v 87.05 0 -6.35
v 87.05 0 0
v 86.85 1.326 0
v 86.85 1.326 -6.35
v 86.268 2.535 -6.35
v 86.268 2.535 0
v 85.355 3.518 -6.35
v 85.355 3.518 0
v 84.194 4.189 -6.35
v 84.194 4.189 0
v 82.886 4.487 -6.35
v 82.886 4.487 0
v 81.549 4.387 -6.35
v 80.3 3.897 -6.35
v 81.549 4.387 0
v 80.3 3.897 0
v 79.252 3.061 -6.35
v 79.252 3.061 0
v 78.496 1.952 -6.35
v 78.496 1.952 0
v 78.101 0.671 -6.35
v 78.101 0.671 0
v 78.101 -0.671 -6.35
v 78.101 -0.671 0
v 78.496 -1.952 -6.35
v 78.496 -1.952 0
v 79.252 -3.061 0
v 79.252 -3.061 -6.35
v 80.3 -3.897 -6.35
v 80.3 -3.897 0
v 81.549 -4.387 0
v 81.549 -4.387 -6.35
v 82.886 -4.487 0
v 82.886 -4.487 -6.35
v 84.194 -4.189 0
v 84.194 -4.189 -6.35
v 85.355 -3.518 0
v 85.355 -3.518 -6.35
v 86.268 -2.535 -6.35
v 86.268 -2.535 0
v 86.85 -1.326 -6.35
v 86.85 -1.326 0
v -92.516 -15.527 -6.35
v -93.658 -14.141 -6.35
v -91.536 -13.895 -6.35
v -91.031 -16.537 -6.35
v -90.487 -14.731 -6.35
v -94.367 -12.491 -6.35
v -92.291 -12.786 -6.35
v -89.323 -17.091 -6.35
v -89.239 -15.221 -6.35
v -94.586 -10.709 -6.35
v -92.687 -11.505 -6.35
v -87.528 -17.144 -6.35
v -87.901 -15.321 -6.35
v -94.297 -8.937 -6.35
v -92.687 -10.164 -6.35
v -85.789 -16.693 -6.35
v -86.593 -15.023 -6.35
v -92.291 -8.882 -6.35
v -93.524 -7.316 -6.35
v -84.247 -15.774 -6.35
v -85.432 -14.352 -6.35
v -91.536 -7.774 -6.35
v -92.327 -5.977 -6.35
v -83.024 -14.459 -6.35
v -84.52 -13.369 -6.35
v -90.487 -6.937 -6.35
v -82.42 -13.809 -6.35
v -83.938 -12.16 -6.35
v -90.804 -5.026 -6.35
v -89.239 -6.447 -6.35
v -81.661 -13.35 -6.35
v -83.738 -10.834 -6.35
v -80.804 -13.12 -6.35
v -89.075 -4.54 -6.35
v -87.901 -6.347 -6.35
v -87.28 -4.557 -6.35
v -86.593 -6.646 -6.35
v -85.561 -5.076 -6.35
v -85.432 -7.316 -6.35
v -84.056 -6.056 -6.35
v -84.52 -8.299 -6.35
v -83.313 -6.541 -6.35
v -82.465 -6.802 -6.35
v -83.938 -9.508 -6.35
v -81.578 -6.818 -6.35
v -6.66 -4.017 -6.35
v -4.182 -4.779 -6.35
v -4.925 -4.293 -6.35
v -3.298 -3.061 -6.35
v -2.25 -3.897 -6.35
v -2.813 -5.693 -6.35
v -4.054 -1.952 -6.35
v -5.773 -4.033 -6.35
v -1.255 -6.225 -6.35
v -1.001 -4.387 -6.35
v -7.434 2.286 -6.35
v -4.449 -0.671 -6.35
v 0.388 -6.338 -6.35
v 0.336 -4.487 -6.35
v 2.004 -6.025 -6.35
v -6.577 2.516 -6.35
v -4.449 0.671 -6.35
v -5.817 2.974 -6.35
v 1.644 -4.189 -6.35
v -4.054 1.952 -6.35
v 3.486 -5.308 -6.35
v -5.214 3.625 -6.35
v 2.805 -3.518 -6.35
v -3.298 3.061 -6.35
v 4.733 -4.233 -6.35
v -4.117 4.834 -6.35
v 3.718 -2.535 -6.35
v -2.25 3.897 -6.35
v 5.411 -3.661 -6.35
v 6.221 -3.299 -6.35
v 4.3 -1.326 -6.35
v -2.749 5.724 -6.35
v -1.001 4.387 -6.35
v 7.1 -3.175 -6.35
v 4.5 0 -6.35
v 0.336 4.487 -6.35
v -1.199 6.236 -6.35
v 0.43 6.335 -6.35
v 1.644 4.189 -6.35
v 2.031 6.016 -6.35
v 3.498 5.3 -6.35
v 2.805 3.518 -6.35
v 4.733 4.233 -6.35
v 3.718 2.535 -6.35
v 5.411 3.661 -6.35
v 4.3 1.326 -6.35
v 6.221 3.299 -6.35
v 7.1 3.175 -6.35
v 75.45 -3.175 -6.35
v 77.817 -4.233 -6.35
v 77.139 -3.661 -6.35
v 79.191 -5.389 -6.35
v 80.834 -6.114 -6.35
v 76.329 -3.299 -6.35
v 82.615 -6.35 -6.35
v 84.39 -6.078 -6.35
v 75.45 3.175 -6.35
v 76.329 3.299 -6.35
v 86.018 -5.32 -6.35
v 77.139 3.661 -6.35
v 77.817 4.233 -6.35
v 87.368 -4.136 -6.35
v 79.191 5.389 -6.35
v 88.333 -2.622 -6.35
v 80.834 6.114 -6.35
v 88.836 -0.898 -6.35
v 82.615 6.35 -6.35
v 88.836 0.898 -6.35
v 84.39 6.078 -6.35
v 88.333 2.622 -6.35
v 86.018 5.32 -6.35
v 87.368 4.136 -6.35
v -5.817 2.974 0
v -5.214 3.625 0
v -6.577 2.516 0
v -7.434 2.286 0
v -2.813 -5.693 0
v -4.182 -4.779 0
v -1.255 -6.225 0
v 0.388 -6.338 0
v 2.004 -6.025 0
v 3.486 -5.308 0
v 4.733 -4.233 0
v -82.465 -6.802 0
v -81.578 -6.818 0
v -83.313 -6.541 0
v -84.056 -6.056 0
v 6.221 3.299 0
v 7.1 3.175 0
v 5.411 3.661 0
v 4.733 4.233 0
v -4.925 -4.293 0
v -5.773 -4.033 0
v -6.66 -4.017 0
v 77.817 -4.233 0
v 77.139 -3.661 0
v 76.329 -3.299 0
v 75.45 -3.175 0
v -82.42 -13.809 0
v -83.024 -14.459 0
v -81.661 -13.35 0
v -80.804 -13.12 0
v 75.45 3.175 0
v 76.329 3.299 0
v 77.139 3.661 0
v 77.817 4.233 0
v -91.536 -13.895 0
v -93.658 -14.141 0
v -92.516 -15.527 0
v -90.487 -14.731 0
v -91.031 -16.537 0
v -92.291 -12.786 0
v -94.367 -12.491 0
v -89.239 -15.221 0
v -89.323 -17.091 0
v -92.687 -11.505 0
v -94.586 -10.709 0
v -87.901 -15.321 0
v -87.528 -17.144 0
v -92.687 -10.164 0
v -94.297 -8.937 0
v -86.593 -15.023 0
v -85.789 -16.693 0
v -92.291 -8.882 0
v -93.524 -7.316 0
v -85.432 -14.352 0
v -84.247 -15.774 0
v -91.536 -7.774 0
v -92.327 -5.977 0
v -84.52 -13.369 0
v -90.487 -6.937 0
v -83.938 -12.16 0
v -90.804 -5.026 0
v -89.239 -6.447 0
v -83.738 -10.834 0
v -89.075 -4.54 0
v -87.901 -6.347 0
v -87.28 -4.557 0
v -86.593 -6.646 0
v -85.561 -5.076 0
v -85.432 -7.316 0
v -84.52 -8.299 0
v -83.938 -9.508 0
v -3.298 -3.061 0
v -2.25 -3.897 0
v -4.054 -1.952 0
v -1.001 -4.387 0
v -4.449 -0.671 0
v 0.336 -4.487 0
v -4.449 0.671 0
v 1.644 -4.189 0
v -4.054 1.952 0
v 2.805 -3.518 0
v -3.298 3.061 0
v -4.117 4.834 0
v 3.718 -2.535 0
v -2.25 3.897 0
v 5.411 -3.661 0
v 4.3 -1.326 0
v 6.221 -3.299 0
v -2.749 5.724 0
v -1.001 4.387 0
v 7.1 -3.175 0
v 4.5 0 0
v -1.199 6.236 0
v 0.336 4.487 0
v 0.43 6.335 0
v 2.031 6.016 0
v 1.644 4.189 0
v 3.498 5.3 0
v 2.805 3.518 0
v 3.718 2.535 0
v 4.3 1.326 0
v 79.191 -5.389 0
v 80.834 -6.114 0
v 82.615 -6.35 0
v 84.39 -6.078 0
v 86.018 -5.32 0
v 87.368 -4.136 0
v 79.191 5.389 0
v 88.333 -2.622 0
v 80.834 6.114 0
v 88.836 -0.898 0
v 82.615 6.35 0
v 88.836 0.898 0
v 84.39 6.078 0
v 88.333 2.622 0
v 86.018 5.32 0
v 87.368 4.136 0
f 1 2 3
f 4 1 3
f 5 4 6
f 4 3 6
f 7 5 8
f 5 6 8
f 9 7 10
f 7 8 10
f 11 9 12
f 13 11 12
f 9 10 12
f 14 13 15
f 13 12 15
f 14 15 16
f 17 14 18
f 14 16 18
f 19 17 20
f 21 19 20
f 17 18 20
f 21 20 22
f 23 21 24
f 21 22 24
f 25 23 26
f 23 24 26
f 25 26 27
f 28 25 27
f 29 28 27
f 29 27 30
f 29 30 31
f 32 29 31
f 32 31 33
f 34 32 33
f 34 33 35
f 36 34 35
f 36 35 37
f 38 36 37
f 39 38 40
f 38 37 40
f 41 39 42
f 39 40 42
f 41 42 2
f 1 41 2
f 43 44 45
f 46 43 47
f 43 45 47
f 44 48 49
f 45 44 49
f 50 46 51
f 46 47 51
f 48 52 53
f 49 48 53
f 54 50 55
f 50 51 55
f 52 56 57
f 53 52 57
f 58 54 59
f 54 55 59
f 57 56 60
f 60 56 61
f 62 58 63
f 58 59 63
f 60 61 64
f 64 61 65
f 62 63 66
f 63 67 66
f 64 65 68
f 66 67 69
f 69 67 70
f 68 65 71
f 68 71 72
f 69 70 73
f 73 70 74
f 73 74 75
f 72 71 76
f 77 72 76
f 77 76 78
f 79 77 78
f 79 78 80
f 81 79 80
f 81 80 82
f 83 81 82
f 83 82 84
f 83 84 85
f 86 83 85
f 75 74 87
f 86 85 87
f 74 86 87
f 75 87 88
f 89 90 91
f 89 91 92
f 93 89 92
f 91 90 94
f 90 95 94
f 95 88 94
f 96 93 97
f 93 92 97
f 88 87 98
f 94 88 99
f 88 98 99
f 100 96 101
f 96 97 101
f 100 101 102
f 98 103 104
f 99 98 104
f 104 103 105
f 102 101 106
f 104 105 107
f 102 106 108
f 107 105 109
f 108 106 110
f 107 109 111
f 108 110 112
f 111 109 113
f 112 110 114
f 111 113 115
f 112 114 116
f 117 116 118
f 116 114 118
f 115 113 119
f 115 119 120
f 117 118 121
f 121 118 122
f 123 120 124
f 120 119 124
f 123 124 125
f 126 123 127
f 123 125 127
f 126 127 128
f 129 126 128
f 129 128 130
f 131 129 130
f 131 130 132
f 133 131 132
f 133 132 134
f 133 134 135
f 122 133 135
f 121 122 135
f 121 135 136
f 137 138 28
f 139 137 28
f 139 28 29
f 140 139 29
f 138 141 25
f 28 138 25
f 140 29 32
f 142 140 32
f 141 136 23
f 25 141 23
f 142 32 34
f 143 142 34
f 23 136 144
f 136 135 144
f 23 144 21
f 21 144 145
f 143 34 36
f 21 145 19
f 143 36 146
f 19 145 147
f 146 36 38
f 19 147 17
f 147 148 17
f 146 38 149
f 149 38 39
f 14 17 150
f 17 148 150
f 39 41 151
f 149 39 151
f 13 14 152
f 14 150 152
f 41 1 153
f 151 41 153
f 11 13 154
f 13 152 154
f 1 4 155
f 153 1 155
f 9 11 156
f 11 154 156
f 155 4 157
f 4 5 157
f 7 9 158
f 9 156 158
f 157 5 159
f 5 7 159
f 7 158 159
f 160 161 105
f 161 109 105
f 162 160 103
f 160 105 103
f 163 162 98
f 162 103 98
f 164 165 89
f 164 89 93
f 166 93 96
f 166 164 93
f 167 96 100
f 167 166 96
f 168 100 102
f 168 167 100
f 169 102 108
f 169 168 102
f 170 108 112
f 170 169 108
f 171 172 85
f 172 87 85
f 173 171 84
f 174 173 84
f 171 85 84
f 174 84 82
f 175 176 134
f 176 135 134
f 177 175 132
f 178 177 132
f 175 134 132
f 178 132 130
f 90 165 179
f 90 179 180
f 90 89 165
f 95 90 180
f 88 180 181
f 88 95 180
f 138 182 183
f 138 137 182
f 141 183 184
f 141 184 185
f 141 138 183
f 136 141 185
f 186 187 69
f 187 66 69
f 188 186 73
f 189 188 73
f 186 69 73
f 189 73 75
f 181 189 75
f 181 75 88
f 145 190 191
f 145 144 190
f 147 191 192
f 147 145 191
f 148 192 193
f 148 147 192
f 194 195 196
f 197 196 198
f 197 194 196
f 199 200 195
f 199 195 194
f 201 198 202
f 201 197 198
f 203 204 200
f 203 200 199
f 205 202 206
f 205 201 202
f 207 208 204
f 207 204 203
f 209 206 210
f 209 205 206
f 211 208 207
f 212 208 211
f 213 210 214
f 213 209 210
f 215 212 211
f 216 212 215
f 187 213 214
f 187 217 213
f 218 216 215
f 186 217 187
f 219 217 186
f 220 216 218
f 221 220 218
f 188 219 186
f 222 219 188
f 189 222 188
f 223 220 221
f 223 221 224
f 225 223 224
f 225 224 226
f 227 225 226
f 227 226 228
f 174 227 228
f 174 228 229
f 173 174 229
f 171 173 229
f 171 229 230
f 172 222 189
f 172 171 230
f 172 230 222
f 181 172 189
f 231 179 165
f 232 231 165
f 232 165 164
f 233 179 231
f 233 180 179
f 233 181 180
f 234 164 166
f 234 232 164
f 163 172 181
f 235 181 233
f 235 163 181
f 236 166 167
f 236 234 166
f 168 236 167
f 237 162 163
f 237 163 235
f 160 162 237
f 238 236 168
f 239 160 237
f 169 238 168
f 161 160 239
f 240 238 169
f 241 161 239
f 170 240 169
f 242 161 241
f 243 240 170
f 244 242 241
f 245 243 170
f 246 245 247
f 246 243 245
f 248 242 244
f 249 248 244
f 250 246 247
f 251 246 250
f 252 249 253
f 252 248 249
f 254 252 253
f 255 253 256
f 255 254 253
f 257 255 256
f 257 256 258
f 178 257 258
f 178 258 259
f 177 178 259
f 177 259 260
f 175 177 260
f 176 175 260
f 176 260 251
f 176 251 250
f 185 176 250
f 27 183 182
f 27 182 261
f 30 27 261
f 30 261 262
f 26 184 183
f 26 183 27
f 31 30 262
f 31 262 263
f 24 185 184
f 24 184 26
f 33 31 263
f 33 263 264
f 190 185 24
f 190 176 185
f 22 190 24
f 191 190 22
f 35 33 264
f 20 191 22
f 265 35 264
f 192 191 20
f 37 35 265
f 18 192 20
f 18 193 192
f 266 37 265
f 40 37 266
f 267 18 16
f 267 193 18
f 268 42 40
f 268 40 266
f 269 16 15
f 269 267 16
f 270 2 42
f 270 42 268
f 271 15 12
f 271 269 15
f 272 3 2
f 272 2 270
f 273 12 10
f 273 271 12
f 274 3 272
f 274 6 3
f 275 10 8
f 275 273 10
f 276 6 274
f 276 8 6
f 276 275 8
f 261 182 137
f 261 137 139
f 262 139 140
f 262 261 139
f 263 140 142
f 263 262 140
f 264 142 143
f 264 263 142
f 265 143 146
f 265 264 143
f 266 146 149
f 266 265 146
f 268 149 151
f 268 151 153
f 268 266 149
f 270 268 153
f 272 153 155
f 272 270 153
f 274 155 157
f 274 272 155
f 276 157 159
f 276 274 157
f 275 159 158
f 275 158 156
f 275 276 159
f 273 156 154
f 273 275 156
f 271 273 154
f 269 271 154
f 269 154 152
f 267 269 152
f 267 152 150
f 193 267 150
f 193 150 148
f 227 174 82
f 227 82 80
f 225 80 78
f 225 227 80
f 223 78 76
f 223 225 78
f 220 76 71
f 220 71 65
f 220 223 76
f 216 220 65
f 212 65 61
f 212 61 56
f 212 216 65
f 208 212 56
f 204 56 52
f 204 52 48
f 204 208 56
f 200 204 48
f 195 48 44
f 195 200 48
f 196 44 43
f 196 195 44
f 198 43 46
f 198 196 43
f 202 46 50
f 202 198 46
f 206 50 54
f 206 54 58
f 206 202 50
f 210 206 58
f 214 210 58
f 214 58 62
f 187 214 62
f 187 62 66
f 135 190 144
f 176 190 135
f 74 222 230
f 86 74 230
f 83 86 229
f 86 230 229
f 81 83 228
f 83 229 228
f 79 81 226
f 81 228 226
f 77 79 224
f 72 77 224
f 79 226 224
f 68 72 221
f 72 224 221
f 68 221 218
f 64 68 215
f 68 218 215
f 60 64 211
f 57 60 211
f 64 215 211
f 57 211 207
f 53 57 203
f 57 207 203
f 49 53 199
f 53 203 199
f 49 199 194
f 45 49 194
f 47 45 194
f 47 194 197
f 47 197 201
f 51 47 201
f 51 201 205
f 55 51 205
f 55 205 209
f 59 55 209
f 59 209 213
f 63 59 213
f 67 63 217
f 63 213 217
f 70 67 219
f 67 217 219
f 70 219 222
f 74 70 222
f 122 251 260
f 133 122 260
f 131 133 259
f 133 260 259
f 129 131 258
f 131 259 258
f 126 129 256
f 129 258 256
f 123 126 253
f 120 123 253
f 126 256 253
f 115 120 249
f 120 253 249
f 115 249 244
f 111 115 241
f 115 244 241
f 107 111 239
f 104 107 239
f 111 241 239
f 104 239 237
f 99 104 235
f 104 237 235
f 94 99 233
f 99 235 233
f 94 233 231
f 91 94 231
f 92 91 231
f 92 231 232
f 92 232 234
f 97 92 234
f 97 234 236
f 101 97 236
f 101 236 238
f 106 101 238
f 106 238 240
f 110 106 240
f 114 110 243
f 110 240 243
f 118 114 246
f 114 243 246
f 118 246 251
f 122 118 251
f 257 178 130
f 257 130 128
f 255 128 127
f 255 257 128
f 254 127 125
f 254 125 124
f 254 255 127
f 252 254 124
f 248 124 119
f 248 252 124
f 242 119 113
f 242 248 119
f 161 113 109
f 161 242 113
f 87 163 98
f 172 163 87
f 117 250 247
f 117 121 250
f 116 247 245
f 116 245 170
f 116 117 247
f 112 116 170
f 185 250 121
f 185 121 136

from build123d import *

# Parameters (mm, degrees)
SKETCH1_R           = 4.49961
BOSS_EXTRUDE2_DEPTH = 6.35
FILLET2_R           = 3.175


with BuildPart() as part:
    # Sketch1 → Boss-Extrude2 (new body)
    with BuildSketch(Plane.XY):
        with BuildLine():
            Line((77.050738686, 3.175), (5.499261314, 3.175))
            ThreePointArc((5.499261314, 3.175), (-0.387658226, 6.33815597), (-5.845205819, 2.481142666))
            Line((-5.845205819, 2.481142666), (-83.166017392, -7.012659232))
            ThreePointArc((-83.166017392, -7.012659232), (-94.540020944, -11.608054959), (-82.392147061, -13.315327295))
            Line((-82.392147061, -13.315327295), (-5.071335489, -3.821525397))
            ThreePointArc((-5.071335489, -3.821525397), (0.387658226, -6.33815597), (5.499261314, -3.175))
            Line((5.499261314, -3.175), (77.050738686, -3.175))
            ThreePointArc((77.050738686, -3.175), (88.9, 0), (77.050738686, 3.175))
        make_face()
        Circle(SKETCH1_R, mode=Mode.SUBTRACT)
        with Locations((82.55, 0)):
            Circle(SKETCH1_R, mode=Mode.SUBTRACT)
        with Locations((-88.237352881, -10.834184629)):
            Circle(SKETCH1_R, mode=Mode.SUBTRACT)
    extrude(amount=-BOSS_EXTRUDE2_DEPTH)

    # Fillet2
    fillet2_edges = [part.edges().sort_by_distance(p)[0] for p in [
        (-5.845205819, 2.481142666, -3.175),
        (5.499261314, 3.175, -3.175),
        (77.050738686, 3.175, -3.175),
        (77.050738686, -3.175, -3.175),
        (5.499261314, -3.175, -3.175),
        (-5.071335489, -3.821525397, -3.175),
        (-82.392147061, -13.315327295, -3.175),
        (-83.166017392, -7.012659232, -3.175),
    ]]
    fillet(fillet2_edges, radius=FILLET2_R)


solid = part.part
